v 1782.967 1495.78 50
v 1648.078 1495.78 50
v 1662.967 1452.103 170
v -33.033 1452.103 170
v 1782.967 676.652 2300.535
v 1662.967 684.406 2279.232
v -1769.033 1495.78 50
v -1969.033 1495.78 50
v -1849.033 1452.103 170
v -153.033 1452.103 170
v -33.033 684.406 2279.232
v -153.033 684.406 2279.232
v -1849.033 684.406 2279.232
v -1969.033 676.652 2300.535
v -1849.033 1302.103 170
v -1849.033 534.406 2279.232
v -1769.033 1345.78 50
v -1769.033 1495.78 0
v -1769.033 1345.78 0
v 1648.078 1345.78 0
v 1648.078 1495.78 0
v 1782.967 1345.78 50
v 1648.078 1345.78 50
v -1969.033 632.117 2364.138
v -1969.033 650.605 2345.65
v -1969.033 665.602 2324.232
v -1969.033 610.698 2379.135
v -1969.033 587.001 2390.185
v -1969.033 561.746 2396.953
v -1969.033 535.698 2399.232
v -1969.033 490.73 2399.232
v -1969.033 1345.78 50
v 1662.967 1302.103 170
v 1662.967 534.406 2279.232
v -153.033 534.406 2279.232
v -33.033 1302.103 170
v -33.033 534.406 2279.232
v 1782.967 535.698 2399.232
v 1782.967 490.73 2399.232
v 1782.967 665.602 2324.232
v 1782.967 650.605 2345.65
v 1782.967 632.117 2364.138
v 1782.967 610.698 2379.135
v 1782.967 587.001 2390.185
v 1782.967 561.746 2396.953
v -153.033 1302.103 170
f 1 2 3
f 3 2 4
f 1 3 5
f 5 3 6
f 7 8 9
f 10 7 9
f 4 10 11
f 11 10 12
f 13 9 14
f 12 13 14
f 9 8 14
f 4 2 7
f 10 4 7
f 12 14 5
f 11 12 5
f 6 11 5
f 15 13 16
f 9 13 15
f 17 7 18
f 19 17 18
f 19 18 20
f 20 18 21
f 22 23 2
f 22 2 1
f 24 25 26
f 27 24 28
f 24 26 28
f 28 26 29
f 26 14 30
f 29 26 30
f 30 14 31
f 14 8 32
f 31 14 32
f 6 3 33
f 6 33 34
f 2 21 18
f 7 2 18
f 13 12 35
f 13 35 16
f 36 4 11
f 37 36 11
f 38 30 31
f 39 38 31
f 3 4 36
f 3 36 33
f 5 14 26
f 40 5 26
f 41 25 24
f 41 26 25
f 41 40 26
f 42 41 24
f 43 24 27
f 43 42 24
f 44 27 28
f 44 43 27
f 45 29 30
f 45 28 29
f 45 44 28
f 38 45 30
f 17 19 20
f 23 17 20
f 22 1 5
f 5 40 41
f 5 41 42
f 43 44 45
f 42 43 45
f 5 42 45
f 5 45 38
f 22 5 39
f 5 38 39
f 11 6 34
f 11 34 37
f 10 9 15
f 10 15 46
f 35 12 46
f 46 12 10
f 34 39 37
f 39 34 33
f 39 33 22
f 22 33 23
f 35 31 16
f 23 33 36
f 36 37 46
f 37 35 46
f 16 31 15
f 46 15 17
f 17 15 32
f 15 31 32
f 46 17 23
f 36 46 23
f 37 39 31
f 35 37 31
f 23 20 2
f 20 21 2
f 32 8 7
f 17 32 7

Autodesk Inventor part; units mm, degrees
ref_plane "YZ Plane" through (0, 0, 0) normal (1, 0, 0) x (0, 1, 0)
sketch "Sketch1" plane through (0, 0, 0) normal (0, 0, 1) x (1, 0, 0)
  line L0 (1783.0786, 1495.7799) -> (-1969.0329, 1495.7799)
  line L1 (-1969.0329, 1495.7799) -> (-1969.0329, 1345.7799)
  line L2 (-1969.0329, 1345.7799) -> (1783.0786, 1345.7799)
  line L3 (1783.0786, 1345.7799) -> (1783.0786, 1495.7799)
  point P0 (0, 0)
  point P1 (1784.5139, 676.7735)
  point P2 (1648.0785, 676.7735)
  point P3 (-1769.0329, 888.0934)
  point P4 (-1769.0329, 1496.9217)
  point P5 (-1969.0329, -1503.0783)
  point P6 (-1969.0329, 1496.9217)
  dimension "d0" = 150
  dimension "d7" = 3752.1115
extrude "Extrusion1" add sketch "Sketch1" along normal blind 50
ref_plane "Work Plane1" through (0, 0, 50) normal (0, 0, 1) x (1, 0, 0)
ref_plane "Work Plane2" through (-1969.0329, 1495.7799, 0) normal (-1, 0, 0) x (0, -1, 0)
sketch "Sketch2" plane through (-1969.0329, 1495.7799, 0) normal (-1, 0, 0) x (0, -1, 0)
  line L0 (0, 50) -> (150, 50)
  line L1 (0, 50) -> (855.0504, 2399.2316)
  line L2 (0, 50) -> (2500, 50) construction
  line L3 (855.0504, 2399.2316) -> (1005.0504, 2399.2316)
  line L4 (1005.0504, 2399.2316) -> (150, 50)
  point P0 (1495.7799, 0)
  dimension "d4" = 2500
  dimension "d5" = 70
  dimension "d6" = 150
extrude "Extrusion2" add sketch "Sketch2" against normal blind 3752
sketch "Sketch3" plane through (-1969.0329, 1495.7799, 0) normal (0, 1, 0) x (1, 0, 0)
  line L0 (0, 0) -> (0, -50) projected
  line L1 (200, 0) -> (0, 0)
  line L2 (0, 0) -> (0, -25)
  line L3 (200, -25) -> (200, 0)
  line L4 (3752.1115, 0) -> (3752.1115, -50) projected
  line L5 (3617.1114, 0) -> (3752.1115, 0)
  line L6 (3752.1115, 0) -> (3752.1115, -25)
  line L7 (3617.1114, -25) -> (3617.1114, 0)
  line L8 (3617.1114, -25) -> (3617.1114, -50)
  line L9 (3617.1114, -50) -> (3752.1115, -50)
  line L10 (3752.1115, -25) -> (3752.1115, -50)
  line L11 (0, -50) -> (200, -50)
  line L12 (200, -50) -> (200, -25)
  line L13 (0, -25) -> (0, -50)
  point P0 (1969.0329, 0)
extrude "Extrusion3" cut sketch "Sketch3" against normal through all
sketch "Sketch4" plane through (1782.9671, 1495.7799, 0) normal (1, 0, 0) x (0, 0, -1)
  line L0 (-50, 0) -> (-50, -150) projected
  line L1 (-50, 0) -> (-425.877, -136.8081)
  line L2 (-50, 0) -> (-2399.2316, -855.0504) projected
  line L3 (-425.877, -136.8081) -> (-425.877, -146.8081)
  line L4 (-425.877, -146.8081) -> (-444.6709, -153.6485)
  line L5 (-444.6709, -153.6485) -> (-444.6709, -143.6485)
  line L6 (-444.6709, -143.6485) -> (-820.5479, -280.4565)
  line L7 (-820.5479, -280.4565) -> (-820.5479, -290.4565)
  line L8 (-820.5479, -290.4565) -> (-839.3418, -297.2969)
  line L9 (-839.3418, -297.2969) -> (-839.3418, -287.2969)
  line L10 (-839.3418, -287.2969) -> (-1215.2188, -424.105)
  line L11 (-1215.2188, -424.105) -> (-1215.2188, -434.105)
  line L12 (-1215.2188, -434.105) -> (-1234.0127, -440.9454)
  line L13 (-1234.0127, -440.9454) -> (-1234.0127, -430.9454)
  line L14 (-1234.0127, -430.9454) -> (-1609.8898, -567.7534)
  line L15 (-1609.8898, -567.7534) -> (-1609.2626, -577.5252)
  line L16 (-1609.2626, -577.5252) -> (-1628.0565, -584.3656)
  line L17 (-1628.0565, -584.3656) -> (-1628.6836, -574.5938)
  line L18 (-1628.6836, -574.5938) -> (-2004.5607, -711.4019)
  line L19 (-2004.5607, -711.4019) -> (-2003.9335, -721.1736)
  line L20 (-2003.9335, -721.1736) -> (-2022.7274, -728.014)
  line L21 (-2022.7274, -728.014) -> (-2023.3545, -718.2423)
  line L22 (-2023.3545, -718.2423) -> (-425.877, -136.8081)
  point P0 (0, -1495.7799)
  dimension "d12" = 400
  dimension "d13" = 10
  dimension "d14" = 20
  dimension "d15" = 400
  dimension "d16" = 20
  dimension "d17" = 400
  dimension "d18" = 20
  dimension "d19" = 400
  dimension "d20" = 20
  dimension "d21" = 400
  dimension "d22" = 20
sketch "Sketch5" plane through (-1769.0329, 1495.7799, 0) normal (0, 1, 0) x (1, 0, 0)
  line L0 (-200, -2399.2316) -> (-200, -50) projected
  line L1 (-200, -2399.2316) -> (3552, -2399.2316) projected
  line L2 (3552, -50) -> (3552, -2399.2316) projected
  line L3 (3552, -50) -> (3417.1114, -50) projected
  line L4 (3417.1114, -50) -> (0, -50) projected
  line L5 (0, -50) -> (-200, -50) projected
  line L6 (-200, -50) -> (-80, -50)
  line L7 (-80, -50) -> (-80, -170)
  line L8 (-80, -170) -> (-200, -170)
  line L9 (-200, -170) -> (-200, -50)
  line L10 (3552, -2399.2316) -> (3432, -2399.2316)
  line L11 (3432, -2399.2316) -> (3432, -2279.2316)
  line L12 (3432, -2279.2316) -> (3552, -2279.2316)
  line L13 (3552, -2279.2316) -> (3552, -2399.2316)
  line L14 (3432, -2279.2316) -> (-80, -2279.2316)
  line L15 (-80, -2279.2316) -> (-80, -170)
  line L16 (-80, -170) -> (3432, -170)
  line L17 (3432, -170) -> (3432, -2279.2316)
  line L18 (1676, -2279.2316) -> (1616, -2279.2316)
  line L19 (1616, -2279.2316) -> (1616, -170)
  line L20 (1616, -170) -> (1676, -170)
  line L21 (1676, -170) -> (1736, -170)
  line L22 (1736, -170) -> (1736, -2279.2316)
  line L23 (1736, -2279.2316) -> (1676, -2279.2316)
  point P0 (1769.0329, 0)
  dimension "d23" = 120
  dimension "d24" = 120
  dimension "d25" = 120
  dimension "d26" = 120
fillet "Fillet1" radius 150 1 edges at (-93.0329, 640.7295, 2399.2316)
extrude "Extrusion5" cut sketch "Sketch5" against normal through all contours L16 L19 L14 L15 | L14 L22 L16 L17
sketch "Sketch6" plane through (-1849.0329, 534.4059, 2279.2316) normal (1, 0, 0) x (0, 0, -1)
  line L0 (0, 150) -> (2109.2316, 917.6975) projected
  line L1 (0, 150) -> (0, 0) projected
  line L2 (2109.2316, 767.6975) -> (0, 0) projected
  line L3 (2109.2316, 917.6975) -> (2109.2316, 767.6975) projected
  point P0 (2279.2316, -534.4059)
properties part number "side_curve_frame_02" material "Wood (Maple)"
